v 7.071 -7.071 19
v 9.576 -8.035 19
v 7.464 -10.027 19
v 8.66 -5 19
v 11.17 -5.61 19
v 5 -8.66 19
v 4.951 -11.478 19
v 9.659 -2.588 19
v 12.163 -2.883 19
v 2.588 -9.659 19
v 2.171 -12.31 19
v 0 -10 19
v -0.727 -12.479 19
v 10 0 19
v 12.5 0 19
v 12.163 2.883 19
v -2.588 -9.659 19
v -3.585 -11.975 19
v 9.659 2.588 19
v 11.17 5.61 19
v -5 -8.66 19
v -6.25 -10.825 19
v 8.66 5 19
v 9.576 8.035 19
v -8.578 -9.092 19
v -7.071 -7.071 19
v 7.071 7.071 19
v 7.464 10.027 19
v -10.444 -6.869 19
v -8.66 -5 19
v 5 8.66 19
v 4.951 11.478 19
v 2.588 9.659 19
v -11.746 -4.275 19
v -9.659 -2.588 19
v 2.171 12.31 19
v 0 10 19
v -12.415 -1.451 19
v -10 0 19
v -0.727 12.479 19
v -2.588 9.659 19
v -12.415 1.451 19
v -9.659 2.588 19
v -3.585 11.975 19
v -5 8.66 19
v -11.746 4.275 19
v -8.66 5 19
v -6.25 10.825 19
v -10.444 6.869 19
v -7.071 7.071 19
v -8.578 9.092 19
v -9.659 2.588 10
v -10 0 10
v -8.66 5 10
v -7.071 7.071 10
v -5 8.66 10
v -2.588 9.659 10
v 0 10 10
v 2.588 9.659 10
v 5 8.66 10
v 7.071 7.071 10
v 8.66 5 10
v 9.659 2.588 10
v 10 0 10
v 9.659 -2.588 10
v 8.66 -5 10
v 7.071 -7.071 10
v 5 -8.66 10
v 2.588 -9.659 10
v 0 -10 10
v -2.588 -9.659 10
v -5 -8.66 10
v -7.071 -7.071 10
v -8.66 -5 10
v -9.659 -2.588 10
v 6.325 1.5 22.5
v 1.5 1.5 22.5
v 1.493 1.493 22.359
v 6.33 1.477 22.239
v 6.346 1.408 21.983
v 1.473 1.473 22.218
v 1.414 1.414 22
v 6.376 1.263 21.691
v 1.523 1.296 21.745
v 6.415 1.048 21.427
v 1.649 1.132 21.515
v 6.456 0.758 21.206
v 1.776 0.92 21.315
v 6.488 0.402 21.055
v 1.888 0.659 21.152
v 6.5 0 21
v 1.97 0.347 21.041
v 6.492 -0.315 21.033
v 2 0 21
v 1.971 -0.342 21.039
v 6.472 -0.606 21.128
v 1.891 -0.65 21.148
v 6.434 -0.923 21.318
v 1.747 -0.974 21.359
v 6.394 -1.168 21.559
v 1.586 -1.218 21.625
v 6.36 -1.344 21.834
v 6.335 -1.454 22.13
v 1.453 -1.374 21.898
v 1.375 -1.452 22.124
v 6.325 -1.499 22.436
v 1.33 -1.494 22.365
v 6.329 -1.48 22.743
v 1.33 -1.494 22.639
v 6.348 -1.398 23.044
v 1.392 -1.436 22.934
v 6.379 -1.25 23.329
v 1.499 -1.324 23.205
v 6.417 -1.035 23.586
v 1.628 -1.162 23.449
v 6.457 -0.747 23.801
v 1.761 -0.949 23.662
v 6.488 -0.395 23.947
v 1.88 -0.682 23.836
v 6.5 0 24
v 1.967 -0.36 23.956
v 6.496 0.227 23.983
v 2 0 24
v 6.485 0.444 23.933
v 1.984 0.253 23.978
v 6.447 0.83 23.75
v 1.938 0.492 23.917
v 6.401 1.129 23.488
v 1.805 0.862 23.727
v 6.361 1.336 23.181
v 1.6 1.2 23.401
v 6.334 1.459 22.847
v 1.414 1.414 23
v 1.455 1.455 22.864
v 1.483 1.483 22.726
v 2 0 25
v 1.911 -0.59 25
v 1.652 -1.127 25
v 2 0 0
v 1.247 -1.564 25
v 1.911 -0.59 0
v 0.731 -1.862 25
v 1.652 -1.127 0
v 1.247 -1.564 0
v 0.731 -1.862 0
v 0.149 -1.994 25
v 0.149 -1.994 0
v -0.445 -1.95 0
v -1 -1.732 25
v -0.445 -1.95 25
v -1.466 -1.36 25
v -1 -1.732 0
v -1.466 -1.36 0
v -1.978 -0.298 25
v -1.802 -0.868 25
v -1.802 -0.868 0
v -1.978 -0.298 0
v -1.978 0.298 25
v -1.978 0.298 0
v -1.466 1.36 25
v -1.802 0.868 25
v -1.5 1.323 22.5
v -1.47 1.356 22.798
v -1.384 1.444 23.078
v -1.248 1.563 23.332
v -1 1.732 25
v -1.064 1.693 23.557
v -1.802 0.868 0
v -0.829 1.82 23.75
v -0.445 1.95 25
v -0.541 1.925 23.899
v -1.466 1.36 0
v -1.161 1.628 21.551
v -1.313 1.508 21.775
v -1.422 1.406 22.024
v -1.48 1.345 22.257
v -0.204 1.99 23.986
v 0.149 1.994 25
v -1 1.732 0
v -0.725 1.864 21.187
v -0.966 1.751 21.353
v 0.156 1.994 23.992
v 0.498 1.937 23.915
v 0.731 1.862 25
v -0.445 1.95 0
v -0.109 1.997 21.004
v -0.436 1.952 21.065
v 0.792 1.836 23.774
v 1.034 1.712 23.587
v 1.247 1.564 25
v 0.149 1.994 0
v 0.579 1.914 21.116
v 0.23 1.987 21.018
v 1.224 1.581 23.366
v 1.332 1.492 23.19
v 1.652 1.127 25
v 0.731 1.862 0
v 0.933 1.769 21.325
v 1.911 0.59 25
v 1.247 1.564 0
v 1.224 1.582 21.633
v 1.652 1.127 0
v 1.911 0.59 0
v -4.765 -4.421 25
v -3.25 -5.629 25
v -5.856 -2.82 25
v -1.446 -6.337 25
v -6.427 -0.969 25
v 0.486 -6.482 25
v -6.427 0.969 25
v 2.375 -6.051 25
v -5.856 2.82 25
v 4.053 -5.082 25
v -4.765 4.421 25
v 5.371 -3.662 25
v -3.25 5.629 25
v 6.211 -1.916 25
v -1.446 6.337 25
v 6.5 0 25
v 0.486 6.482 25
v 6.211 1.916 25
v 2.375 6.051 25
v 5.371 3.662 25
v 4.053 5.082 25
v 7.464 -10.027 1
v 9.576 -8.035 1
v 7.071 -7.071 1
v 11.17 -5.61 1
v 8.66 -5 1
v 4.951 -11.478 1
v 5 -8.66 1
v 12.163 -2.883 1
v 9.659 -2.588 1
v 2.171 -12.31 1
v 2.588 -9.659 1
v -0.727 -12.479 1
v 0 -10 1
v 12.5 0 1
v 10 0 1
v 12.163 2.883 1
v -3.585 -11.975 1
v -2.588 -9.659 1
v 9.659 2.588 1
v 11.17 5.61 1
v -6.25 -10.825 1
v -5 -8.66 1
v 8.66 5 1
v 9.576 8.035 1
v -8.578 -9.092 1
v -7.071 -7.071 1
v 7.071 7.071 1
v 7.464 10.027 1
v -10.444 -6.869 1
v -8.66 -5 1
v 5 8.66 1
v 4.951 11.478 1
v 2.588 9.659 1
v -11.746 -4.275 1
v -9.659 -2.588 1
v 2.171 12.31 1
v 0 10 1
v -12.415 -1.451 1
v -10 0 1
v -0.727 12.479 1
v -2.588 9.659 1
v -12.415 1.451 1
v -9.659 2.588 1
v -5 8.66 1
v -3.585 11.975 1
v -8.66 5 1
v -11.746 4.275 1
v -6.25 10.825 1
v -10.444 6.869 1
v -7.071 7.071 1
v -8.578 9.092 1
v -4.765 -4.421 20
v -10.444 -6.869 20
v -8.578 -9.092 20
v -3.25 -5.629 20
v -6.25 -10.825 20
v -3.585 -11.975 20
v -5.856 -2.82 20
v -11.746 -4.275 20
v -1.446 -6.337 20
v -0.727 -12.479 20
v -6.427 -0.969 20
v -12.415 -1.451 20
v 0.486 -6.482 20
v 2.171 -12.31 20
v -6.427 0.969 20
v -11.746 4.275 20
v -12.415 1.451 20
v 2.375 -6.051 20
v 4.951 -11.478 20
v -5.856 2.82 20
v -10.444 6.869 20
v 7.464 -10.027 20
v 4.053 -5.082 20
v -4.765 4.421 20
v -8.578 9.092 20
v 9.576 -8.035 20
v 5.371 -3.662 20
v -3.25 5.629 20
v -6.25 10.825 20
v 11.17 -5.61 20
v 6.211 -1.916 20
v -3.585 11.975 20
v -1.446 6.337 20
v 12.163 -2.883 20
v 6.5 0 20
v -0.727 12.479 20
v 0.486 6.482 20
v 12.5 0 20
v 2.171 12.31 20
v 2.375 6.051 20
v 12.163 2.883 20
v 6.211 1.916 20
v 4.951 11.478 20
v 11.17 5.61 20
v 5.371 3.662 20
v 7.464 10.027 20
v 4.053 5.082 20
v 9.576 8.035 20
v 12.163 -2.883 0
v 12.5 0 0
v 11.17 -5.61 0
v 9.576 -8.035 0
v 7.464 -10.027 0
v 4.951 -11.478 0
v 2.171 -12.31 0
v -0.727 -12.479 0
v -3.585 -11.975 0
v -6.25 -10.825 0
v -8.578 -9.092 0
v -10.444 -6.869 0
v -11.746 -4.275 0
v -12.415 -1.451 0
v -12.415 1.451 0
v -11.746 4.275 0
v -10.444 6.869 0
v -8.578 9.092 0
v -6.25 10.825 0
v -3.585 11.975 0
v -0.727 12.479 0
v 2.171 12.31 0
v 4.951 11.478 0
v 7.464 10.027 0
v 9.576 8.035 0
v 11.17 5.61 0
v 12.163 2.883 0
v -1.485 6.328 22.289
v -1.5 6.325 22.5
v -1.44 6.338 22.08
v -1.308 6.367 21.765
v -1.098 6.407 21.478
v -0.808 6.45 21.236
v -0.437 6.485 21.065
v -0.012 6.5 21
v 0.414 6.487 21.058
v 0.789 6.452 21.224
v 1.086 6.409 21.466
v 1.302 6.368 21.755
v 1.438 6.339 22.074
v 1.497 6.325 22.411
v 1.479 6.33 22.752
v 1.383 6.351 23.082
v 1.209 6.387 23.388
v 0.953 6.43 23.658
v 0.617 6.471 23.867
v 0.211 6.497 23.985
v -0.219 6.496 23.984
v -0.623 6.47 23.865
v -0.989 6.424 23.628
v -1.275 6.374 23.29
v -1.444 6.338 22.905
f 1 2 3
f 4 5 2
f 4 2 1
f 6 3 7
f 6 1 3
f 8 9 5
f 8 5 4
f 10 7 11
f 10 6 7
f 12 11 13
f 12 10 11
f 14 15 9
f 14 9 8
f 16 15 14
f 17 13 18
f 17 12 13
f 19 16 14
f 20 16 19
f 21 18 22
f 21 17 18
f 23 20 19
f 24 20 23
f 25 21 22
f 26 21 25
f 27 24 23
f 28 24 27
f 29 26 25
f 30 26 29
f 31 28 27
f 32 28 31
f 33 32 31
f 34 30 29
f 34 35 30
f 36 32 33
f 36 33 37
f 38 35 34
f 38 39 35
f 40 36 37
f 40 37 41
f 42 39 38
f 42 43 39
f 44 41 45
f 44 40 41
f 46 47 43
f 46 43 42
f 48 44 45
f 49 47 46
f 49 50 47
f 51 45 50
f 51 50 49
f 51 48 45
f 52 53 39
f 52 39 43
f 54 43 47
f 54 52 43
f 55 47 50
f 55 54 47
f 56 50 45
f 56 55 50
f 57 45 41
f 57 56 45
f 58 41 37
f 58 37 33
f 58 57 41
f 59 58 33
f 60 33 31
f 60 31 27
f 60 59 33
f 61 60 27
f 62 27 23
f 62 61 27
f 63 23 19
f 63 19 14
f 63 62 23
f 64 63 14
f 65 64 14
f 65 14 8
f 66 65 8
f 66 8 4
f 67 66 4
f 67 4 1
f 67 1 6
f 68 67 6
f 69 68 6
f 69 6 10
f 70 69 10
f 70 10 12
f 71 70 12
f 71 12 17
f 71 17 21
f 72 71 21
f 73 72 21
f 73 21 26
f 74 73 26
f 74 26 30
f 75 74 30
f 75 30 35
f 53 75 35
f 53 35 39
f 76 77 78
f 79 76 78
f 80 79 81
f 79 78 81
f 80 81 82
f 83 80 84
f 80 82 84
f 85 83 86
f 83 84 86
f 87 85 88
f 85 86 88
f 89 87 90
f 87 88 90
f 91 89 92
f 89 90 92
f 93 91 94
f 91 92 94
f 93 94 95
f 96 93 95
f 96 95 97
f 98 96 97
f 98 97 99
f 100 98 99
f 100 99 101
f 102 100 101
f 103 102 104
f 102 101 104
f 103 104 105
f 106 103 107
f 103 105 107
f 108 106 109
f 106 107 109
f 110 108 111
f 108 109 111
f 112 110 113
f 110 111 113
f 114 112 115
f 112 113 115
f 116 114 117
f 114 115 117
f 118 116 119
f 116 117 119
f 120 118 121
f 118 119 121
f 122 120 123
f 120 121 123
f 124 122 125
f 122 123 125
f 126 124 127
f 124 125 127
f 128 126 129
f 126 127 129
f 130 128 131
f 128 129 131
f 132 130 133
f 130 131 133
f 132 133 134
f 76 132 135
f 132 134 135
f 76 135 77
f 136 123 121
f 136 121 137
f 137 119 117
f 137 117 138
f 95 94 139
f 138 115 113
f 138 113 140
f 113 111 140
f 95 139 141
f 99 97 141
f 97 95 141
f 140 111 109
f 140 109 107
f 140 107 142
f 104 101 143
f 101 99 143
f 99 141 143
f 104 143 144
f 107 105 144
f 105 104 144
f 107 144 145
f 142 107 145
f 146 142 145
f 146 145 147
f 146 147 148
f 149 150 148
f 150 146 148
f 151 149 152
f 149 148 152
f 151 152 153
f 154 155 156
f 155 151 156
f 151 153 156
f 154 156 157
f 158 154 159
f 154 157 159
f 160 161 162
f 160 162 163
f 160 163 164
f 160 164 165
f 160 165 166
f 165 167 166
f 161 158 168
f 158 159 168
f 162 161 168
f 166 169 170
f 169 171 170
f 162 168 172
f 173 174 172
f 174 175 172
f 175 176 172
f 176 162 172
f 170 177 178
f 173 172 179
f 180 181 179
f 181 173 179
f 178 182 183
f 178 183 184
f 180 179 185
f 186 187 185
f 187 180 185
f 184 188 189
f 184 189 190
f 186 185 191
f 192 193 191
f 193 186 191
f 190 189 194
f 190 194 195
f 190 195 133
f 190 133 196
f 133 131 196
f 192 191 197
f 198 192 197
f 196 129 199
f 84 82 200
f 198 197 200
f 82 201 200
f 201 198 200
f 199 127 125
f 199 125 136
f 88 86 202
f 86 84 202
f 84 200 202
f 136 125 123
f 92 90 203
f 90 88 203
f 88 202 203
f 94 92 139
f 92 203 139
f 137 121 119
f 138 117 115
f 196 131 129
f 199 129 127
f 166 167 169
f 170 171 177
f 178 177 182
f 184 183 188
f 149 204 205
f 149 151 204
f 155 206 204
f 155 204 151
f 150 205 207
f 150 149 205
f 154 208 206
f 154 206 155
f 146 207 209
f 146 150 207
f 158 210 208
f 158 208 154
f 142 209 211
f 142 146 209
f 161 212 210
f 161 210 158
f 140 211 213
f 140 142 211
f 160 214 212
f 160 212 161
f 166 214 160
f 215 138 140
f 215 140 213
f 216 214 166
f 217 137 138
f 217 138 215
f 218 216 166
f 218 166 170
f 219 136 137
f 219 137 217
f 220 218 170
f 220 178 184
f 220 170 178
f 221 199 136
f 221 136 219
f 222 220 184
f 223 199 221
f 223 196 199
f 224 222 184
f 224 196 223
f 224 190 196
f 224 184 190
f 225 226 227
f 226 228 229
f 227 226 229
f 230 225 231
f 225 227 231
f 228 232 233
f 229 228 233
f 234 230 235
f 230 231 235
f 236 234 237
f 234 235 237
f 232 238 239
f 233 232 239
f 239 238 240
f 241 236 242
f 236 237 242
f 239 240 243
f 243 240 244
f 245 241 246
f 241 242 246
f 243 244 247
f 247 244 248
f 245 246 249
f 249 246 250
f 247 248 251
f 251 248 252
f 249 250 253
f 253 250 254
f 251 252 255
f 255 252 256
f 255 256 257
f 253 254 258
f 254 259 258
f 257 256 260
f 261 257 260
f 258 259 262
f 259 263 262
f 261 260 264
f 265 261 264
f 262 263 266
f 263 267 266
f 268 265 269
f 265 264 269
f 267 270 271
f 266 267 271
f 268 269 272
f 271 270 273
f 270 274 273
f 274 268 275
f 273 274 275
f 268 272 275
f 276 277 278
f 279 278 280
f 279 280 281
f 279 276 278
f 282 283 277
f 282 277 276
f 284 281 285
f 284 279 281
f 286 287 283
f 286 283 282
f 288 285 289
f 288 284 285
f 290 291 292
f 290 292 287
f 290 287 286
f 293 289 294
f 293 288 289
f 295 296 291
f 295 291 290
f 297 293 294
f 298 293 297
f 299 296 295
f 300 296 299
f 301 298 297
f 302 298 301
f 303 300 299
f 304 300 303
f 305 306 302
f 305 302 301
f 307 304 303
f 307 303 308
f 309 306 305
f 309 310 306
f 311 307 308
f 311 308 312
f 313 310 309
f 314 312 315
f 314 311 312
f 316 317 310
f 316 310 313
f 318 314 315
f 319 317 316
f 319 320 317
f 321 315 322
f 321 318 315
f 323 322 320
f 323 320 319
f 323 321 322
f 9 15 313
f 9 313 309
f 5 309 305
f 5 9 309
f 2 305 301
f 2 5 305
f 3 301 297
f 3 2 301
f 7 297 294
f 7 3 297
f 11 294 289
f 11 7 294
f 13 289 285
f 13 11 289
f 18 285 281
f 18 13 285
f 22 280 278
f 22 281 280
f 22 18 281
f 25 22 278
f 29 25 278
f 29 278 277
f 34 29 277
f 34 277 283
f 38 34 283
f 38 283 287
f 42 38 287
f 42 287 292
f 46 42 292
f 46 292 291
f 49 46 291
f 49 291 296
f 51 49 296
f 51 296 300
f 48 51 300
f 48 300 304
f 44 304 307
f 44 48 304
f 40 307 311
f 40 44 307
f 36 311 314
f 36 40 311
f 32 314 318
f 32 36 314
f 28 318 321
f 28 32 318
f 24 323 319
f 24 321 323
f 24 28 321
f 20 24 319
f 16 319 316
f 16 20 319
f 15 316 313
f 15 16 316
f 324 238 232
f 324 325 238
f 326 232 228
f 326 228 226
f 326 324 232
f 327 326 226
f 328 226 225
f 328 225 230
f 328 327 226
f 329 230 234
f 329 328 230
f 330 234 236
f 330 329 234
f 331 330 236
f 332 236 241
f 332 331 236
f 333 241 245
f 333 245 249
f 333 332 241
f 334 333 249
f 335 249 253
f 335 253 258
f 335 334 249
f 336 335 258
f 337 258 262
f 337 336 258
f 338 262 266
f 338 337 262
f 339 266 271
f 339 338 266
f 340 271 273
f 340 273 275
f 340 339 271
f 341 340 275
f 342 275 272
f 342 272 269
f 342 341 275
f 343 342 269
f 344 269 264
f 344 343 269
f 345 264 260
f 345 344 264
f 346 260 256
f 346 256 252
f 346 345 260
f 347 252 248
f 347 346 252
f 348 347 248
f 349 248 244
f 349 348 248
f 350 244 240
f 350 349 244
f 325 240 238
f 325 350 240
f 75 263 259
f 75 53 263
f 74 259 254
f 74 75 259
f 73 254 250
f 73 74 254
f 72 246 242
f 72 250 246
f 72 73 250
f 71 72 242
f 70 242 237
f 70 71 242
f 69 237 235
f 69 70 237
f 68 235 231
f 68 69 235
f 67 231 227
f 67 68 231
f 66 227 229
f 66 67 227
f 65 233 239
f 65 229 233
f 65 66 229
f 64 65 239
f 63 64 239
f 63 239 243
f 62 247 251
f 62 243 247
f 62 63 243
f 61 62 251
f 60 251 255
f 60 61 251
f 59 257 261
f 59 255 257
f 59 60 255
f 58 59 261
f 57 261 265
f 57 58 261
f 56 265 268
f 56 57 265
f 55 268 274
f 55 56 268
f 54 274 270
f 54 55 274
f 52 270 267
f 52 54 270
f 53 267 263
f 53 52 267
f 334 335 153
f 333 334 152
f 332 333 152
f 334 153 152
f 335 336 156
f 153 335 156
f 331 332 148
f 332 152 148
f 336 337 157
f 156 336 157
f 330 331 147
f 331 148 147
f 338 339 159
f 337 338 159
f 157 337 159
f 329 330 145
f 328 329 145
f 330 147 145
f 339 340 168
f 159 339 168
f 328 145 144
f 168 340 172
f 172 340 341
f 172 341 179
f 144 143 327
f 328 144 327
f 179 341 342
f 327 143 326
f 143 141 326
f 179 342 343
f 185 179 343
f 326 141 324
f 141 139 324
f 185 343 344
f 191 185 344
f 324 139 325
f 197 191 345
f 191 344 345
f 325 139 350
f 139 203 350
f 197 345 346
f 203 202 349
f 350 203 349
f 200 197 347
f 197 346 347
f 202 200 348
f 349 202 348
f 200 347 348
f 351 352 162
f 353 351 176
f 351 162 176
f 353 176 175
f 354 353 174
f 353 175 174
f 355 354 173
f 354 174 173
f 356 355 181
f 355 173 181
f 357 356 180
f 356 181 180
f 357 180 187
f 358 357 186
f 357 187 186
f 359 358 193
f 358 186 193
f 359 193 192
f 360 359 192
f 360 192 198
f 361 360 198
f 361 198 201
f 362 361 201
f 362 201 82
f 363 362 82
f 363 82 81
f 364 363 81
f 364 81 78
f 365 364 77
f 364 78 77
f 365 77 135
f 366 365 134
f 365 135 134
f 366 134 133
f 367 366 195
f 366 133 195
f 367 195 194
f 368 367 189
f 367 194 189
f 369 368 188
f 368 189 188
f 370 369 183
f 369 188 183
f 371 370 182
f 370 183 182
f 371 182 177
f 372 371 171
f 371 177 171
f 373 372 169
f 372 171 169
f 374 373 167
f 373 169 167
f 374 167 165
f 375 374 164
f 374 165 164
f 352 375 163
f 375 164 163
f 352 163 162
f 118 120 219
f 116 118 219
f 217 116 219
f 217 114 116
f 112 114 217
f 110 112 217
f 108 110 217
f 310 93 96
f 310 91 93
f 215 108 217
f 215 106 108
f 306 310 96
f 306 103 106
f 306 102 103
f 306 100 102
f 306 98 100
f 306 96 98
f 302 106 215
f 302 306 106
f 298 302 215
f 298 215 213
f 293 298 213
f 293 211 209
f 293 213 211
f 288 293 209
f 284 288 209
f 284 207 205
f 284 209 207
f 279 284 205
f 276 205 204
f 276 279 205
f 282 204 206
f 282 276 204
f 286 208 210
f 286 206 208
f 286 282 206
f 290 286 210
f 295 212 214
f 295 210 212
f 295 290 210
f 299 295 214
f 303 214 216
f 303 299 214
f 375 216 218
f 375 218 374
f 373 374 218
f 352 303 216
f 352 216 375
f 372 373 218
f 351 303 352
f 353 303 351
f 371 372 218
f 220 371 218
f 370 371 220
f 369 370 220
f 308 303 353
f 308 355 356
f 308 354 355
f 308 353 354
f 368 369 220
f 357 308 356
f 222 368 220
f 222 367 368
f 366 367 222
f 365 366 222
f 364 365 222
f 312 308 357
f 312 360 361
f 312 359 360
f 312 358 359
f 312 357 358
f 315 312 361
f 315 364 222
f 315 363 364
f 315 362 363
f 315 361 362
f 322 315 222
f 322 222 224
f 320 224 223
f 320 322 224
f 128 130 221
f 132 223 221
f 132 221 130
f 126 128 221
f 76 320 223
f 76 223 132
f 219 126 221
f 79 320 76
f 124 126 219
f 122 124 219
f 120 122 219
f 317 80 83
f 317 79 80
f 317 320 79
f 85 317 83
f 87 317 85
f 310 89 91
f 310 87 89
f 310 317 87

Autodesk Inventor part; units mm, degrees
ref_plane "YZ Plane" through (0, 0, 0) normal (1, 0, 0) x (0, 1, 0)
ref_plane "XZ Plane" through (0, 0, 0) normal (0, 1, 0) x (-1, 0, 0)
sketch "Sketch1" plane through (0, 0, 0) normal (0, 0, 1) x (1, 0, 0)
  circle A0 centre (0, 0) radius 12.5
  circle A1 centre (0, 0) radius 2
  dimension "d0" = 25
  dimension "d1" = 4
extrude "Extrusion1" add sketch "Sketch1" along normal blind 20
sketch "Sketch2" plane through (0, 0, 20) normal (0, 0, 1) x (1, 0, 0)
  circle A0 centre (0, 0) radius 2 projected
  circle A1 centre (0, 0) radius 6.5
  dimension "d4" = 13
extrude "Extrusion2" add sketch "Sketch2" along normal blind 5
ref_plane "Work Plane1" through (0, 0, 10) normal (0, 0, -1) x (-1, 0, 0)
sketch "Sketch3" plane through (0, 0, 10) normal (0, 0, -1) x (-1, 0, 0)
  circle A0 centre (0, 0) radius 10
  circle A1 centre (0, 0) radius 12.5 projected
  dimension "d7" = 20
extrude "Extrusion3" cut sketch "Sketch3" along normal mid plane 18
sketch "Sketch6" plane through (0, 0, 0) normal (0, 1, 0) x (-1, 0, 0)
  line L0 (6.5, 25) -> (-6.5, 25) projected
  line L1 (-6.5, 20) -> (6.5, 20) projected
  line L2 (-2, 25) -> (2, 25) projected
  line L3 (-2, 25) -> (2, 25) projected
  line L4 (2, 0) -> (-2, 0) projected
  circle A0 centre (0, 22.5) radius 1.5
  line L5 (6.5, 20) -> (6.5, 25) projected
  line L6 (-6.5, 20) -> (-6.5, 25) projected
  point P0 (0, 0)
  point P1 (0, 20)
  point P2 (6.5, 22.5)
  dimension "d36" = 3
extrude "Extrusion4" cut sketch "Sketch6" along normal through all contours A0
sketch "Sketch7" plane through (0, 0, 0) normal (1, 0, 0) x (0, 1, 0)
  line L0 (-2, 25) -> (2, 25) projected
  line L1 (6.5, 20) -> (6.5, 25) projected
  circle A0 centre (0, 22.5) radius 1.5
  point P0 (0, 0)
  point P1 (0, 25)
  point P2 (6.5, 22.5)
  dimension "d39" = 3
extrude "Extrusion5" cut sketch "Sketch7" along normal through all
properties part number "Timing Belt - 8mm Bore 5mm Pitch 14 Teeth 15mm Wide" material "Aluminum 6061"
